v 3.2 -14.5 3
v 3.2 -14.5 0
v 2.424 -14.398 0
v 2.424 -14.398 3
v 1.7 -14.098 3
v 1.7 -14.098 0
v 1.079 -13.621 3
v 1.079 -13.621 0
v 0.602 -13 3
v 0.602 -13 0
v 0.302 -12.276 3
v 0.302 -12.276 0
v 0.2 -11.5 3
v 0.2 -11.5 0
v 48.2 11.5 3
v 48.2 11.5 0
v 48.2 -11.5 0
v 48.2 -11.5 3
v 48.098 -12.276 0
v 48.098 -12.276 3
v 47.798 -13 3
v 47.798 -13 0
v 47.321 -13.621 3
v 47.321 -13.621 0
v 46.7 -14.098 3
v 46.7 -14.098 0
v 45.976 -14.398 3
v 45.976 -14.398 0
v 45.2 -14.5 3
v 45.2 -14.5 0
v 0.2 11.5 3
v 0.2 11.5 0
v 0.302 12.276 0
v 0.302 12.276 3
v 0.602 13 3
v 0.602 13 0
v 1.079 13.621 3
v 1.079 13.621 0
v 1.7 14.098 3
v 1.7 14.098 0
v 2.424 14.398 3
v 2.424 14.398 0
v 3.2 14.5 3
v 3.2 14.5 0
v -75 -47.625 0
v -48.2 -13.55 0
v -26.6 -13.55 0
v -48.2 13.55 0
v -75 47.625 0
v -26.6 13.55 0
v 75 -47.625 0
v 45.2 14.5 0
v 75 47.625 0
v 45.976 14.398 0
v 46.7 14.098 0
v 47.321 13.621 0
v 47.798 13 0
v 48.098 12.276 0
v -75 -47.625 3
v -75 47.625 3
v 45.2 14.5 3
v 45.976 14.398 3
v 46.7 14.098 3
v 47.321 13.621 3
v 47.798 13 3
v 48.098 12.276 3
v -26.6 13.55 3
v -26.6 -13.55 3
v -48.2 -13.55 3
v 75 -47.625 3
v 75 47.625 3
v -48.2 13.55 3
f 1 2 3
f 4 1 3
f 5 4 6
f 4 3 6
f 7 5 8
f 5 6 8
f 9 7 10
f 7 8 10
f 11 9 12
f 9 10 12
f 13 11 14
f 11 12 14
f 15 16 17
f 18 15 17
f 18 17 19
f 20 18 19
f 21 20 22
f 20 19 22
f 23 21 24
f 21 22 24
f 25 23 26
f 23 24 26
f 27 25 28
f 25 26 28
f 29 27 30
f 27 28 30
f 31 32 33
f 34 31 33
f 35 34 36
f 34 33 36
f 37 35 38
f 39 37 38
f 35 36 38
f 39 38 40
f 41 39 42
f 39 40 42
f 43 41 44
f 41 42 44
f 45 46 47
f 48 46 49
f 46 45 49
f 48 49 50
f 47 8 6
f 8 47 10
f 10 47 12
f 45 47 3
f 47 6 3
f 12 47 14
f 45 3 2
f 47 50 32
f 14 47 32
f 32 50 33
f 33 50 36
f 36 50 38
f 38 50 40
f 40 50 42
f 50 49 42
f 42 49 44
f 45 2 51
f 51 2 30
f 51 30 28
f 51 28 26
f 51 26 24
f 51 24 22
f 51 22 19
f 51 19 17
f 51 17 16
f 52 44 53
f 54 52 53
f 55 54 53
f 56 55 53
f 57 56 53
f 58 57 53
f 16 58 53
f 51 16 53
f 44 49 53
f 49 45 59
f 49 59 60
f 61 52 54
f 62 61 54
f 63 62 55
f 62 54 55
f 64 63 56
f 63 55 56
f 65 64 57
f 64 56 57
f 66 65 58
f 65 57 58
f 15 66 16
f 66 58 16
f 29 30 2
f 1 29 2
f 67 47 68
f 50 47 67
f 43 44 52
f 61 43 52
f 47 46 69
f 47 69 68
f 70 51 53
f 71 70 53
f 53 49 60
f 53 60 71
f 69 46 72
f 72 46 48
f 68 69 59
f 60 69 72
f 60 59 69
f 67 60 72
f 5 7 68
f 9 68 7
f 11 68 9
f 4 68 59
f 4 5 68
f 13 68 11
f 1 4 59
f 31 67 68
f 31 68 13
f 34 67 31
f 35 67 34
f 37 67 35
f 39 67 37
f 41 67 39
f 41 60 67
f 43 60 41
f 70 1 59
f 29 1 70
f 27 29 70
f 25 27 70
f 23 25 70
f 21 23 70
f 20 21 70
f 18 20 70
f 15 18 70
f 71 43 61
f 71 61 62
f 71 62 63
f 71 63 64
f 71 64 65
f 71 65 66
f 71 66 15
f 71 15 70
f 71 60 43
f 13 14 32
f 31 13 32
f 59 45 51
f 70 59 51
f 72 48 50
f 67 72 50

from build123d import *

# Parameters (mm, degrees)
SKETCH_1_W          = 150
SKETCH_1_H          = 95.25
EXTRUDE_1_DEPTH     = 3
SKETCH_1_3_W        = 21.6
SKETCH_1_3_H        = 27.1
CUT_EXTRUDE_2_DEPTH = 3


with BuildPart() as part:
    # 草圖1 → 填料-伸長1 (new body)
    with BuildSketch(Plane.XY):
        Rectangle(SKETCH_1_W, SKETCH_1_H)
    extrude(amount=EXTRUDE_1_DEPTH)

    # 草圖1<3> → 除料-伸長2 (cut)
    with BuildSketch(Plane.XY):
        with Locations((-37.4, 0)):
            Rectangle(SKETCH_1_3_W, SKETCH_1_3_H)
        with BuildLine():
            Line((45.2, 14.5), (3.2, 14.5))
            ThreePointArc((3.2, 14.5), (1.078679656, 13.621320344), (0.2, 11.5))
            Line((0.2, 11.5), (0.2, -11.5))
            ThreePointArc((0.2, -11.5), (1.078679656, -13.621320344), (3.2, -14.5))
            Line((3.2, -14.5), (45.2, -14.5))
            ThreePointArc((45.2, -14.5), (47.321320344, -13.621320344), (48.2, -11.5))
            Line((48.2, -11.5), (48.2, 11.5))
            ThreePointArc((48.2, 11.5), (47.321320344, 13.621320344), (45.2, 14.5))
        make_face()
    extrude(amount=CUT_EXTRUDE_2_DEPTH, mode=Mode.SUBTRACT)


solid = part.part
